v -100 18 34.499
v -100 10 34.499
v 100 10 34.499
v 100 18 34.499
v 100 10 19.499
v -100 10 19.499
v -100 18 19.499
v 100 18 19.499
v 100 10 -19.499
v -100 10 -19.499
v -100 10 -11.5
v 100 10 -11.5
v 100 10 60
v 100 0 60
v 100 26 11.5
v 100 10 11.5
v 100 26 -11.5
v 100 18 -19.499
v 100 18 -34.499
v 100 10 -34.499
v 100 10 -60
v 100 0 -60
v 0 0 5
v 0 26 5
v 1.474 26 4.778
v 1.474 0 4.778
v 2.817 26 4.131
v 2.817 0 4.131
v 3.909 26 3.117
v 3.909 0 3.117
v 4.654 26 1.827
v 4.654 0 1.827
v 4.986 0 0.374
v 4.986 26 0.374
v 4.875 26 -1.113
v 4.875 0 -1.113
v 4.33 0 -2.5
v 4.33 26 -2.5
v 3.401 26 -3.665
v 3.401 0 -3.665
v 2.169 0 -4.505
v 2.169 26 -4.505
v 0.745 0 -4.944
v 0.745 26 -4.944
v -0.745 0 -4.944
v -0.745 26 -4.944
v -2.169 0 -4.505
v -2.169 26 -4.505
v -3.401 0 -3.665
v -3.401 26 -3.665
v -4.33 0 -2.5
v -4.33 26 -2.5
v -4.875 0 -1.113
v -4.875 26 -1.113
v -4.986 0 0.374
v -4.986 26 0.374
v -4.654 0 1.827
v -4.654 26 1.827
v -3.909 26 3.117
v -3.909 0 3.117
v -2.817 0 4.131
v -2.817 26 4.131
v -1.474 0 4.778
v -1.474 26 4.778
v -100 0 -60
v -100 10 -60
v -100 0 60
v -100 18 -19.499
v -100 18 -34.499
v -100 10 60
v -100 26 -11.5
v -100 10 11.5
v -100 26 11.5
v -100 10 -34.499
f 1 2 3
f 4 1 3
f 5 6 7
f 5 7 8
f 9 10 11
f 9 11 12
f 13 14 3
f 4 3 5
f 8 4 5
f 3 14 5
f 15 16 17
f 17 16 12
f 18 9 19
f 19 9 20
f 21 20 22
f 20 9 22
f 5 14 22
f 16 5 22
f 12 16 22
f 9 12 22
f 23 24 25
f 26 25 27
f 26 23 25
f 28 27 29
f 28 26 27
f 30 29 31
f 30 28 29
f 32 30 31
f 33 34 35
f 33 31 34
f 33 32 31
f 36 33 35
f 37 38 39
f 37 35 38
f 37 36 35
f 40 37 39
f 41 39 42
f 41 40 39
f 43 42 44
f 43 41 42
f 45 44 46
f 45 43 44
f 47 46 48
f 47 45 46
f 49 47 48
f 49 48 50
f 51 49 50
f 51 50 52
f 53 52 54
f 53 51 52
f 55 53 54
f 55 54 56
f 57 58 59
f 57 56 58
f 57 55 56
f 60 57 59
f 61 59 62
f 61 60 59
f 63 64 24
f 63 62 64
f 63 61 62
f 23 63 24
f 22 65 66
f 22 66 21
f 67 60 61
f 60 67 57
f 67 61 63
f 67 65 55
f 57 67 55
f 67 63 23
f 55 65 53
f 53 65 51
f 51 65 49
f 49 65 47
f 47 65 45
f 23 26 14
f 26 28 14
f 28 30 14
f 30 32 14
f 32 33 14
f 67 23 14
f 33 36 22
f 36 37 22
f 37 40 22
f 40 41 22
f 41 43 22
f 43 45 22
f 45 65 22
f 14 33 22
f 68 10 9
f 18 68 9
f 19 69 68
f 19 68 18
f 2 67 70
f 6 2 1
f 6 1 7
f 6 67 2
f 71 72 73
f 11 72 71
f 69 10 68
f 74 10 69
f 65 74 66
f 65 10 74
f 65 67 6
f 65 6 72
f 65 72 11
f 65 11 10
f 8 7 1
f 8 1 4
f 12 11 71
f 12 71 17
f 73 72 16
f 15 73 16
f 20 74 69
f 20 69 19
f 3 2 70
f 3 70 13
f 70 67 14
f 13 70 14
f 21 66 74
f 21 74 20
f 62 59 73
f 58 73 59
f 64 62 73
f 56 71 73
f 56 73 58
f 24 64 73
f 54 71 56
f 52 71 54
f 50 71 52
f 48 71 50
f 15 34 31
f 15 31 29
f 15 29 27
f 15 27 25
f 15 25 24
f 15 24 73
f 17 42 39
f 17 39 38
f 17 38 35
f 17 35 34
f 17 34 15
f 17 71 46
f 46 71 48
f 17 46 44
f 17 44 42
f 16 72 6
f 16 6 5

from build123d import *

# Parameters (mm, degrees)
SKETCH1_W               = 200
SKETCH1_H               = 120
BOSS_EXTRUDE1_DEPTH     = 10
SKETCH2_W               = 200
SKETCH2_H               = 15
BOSS_EXTRUDE2_DEPTH     = 8
SKETCH3_R               = 5
CUT_EXTRUDE1_DEPTH      = 118.046999107
SKETCH4_W               = 200
SKETCH4_H               = 23
BOSS_EXTRUDE4_DEPTH     = 16
CUT_EXTRUDE2_DEPTH      = 118.711511756
CUT_EXTRUDE2_DEPTH_BACK = 118.711511756
SKETCH3_2_R             = 5


with BuildPart() as part:
    # Sketch1 → Boss-Extrude1 (new body)
    with BuildSketch(Plane(origin=(0, 0, 0), x_dir=(1, 0, 0), z_dir=(0, 1, 0))):
        Rectangle(SKETCH1_W, SKETCH1_H)
    extrude(amount=BOSS_EXTRUDE1_DEPTH)

    # Sketch2 → Boss-Extrude2 (add)
    with BuildSketch(Plane(origin=(0, 10, 0), x_dir=(1, 0, 0), z_dir=(0, 1, 0))):
        with Locations((0, 26.999)):
            Rectangle(SKETCH2_W, SKETCH2_H)
        with Locations((0, -26.999)):
            Rectangle(SKETCH2_W, SKETCH2_H)
    extrude(amount=BOSS_EXTRUDE2_DEPTH)

    # Sketch3 → Cut-Extrude1 (cut, through all)
    with BuildSketch(Plane(origin=(0, 10, 0), x_dir=(1, 0, 0), z_dir=(0, 1, 0))):
        Circle(SKETCH3_R)
    extrude(amount=-CUT_EXTRUDE1_DEPTH, mode=Mode.SUBTRACT)

    # Sketch4 → Boss-Extrude4 (add)
    with BuildSketch(Plane(origin=(0, 10, 0), x_dir=(1, 0, 0), z_dir=(0, 1, 0))):
        Rectangle(SKETCH4_W, SKETCH4_H)
    extrude(amount=BOSS_EXTRUDE4_DEPTH)

    # Sketch3<2> → Cut-Extrude2 (cut, two sides: drawn at the far end of the back side and taken through both)
    with BuildSketch(Plane(origin=(0, 10, 0), x_dir=(1, 0, 0), z_dir=(0, 1, 0)).offset(-CUT_EXTRUDE2_DEPTH_BACK)):
        Circle(SKETCH3_2_R)
    extrude(amount=CUT_EXTRUDE2_DEPTH + CUT_EXTRUDE2_DEPTH_BACK, mode=Mode.SUBTRACT)


solid = part.part
